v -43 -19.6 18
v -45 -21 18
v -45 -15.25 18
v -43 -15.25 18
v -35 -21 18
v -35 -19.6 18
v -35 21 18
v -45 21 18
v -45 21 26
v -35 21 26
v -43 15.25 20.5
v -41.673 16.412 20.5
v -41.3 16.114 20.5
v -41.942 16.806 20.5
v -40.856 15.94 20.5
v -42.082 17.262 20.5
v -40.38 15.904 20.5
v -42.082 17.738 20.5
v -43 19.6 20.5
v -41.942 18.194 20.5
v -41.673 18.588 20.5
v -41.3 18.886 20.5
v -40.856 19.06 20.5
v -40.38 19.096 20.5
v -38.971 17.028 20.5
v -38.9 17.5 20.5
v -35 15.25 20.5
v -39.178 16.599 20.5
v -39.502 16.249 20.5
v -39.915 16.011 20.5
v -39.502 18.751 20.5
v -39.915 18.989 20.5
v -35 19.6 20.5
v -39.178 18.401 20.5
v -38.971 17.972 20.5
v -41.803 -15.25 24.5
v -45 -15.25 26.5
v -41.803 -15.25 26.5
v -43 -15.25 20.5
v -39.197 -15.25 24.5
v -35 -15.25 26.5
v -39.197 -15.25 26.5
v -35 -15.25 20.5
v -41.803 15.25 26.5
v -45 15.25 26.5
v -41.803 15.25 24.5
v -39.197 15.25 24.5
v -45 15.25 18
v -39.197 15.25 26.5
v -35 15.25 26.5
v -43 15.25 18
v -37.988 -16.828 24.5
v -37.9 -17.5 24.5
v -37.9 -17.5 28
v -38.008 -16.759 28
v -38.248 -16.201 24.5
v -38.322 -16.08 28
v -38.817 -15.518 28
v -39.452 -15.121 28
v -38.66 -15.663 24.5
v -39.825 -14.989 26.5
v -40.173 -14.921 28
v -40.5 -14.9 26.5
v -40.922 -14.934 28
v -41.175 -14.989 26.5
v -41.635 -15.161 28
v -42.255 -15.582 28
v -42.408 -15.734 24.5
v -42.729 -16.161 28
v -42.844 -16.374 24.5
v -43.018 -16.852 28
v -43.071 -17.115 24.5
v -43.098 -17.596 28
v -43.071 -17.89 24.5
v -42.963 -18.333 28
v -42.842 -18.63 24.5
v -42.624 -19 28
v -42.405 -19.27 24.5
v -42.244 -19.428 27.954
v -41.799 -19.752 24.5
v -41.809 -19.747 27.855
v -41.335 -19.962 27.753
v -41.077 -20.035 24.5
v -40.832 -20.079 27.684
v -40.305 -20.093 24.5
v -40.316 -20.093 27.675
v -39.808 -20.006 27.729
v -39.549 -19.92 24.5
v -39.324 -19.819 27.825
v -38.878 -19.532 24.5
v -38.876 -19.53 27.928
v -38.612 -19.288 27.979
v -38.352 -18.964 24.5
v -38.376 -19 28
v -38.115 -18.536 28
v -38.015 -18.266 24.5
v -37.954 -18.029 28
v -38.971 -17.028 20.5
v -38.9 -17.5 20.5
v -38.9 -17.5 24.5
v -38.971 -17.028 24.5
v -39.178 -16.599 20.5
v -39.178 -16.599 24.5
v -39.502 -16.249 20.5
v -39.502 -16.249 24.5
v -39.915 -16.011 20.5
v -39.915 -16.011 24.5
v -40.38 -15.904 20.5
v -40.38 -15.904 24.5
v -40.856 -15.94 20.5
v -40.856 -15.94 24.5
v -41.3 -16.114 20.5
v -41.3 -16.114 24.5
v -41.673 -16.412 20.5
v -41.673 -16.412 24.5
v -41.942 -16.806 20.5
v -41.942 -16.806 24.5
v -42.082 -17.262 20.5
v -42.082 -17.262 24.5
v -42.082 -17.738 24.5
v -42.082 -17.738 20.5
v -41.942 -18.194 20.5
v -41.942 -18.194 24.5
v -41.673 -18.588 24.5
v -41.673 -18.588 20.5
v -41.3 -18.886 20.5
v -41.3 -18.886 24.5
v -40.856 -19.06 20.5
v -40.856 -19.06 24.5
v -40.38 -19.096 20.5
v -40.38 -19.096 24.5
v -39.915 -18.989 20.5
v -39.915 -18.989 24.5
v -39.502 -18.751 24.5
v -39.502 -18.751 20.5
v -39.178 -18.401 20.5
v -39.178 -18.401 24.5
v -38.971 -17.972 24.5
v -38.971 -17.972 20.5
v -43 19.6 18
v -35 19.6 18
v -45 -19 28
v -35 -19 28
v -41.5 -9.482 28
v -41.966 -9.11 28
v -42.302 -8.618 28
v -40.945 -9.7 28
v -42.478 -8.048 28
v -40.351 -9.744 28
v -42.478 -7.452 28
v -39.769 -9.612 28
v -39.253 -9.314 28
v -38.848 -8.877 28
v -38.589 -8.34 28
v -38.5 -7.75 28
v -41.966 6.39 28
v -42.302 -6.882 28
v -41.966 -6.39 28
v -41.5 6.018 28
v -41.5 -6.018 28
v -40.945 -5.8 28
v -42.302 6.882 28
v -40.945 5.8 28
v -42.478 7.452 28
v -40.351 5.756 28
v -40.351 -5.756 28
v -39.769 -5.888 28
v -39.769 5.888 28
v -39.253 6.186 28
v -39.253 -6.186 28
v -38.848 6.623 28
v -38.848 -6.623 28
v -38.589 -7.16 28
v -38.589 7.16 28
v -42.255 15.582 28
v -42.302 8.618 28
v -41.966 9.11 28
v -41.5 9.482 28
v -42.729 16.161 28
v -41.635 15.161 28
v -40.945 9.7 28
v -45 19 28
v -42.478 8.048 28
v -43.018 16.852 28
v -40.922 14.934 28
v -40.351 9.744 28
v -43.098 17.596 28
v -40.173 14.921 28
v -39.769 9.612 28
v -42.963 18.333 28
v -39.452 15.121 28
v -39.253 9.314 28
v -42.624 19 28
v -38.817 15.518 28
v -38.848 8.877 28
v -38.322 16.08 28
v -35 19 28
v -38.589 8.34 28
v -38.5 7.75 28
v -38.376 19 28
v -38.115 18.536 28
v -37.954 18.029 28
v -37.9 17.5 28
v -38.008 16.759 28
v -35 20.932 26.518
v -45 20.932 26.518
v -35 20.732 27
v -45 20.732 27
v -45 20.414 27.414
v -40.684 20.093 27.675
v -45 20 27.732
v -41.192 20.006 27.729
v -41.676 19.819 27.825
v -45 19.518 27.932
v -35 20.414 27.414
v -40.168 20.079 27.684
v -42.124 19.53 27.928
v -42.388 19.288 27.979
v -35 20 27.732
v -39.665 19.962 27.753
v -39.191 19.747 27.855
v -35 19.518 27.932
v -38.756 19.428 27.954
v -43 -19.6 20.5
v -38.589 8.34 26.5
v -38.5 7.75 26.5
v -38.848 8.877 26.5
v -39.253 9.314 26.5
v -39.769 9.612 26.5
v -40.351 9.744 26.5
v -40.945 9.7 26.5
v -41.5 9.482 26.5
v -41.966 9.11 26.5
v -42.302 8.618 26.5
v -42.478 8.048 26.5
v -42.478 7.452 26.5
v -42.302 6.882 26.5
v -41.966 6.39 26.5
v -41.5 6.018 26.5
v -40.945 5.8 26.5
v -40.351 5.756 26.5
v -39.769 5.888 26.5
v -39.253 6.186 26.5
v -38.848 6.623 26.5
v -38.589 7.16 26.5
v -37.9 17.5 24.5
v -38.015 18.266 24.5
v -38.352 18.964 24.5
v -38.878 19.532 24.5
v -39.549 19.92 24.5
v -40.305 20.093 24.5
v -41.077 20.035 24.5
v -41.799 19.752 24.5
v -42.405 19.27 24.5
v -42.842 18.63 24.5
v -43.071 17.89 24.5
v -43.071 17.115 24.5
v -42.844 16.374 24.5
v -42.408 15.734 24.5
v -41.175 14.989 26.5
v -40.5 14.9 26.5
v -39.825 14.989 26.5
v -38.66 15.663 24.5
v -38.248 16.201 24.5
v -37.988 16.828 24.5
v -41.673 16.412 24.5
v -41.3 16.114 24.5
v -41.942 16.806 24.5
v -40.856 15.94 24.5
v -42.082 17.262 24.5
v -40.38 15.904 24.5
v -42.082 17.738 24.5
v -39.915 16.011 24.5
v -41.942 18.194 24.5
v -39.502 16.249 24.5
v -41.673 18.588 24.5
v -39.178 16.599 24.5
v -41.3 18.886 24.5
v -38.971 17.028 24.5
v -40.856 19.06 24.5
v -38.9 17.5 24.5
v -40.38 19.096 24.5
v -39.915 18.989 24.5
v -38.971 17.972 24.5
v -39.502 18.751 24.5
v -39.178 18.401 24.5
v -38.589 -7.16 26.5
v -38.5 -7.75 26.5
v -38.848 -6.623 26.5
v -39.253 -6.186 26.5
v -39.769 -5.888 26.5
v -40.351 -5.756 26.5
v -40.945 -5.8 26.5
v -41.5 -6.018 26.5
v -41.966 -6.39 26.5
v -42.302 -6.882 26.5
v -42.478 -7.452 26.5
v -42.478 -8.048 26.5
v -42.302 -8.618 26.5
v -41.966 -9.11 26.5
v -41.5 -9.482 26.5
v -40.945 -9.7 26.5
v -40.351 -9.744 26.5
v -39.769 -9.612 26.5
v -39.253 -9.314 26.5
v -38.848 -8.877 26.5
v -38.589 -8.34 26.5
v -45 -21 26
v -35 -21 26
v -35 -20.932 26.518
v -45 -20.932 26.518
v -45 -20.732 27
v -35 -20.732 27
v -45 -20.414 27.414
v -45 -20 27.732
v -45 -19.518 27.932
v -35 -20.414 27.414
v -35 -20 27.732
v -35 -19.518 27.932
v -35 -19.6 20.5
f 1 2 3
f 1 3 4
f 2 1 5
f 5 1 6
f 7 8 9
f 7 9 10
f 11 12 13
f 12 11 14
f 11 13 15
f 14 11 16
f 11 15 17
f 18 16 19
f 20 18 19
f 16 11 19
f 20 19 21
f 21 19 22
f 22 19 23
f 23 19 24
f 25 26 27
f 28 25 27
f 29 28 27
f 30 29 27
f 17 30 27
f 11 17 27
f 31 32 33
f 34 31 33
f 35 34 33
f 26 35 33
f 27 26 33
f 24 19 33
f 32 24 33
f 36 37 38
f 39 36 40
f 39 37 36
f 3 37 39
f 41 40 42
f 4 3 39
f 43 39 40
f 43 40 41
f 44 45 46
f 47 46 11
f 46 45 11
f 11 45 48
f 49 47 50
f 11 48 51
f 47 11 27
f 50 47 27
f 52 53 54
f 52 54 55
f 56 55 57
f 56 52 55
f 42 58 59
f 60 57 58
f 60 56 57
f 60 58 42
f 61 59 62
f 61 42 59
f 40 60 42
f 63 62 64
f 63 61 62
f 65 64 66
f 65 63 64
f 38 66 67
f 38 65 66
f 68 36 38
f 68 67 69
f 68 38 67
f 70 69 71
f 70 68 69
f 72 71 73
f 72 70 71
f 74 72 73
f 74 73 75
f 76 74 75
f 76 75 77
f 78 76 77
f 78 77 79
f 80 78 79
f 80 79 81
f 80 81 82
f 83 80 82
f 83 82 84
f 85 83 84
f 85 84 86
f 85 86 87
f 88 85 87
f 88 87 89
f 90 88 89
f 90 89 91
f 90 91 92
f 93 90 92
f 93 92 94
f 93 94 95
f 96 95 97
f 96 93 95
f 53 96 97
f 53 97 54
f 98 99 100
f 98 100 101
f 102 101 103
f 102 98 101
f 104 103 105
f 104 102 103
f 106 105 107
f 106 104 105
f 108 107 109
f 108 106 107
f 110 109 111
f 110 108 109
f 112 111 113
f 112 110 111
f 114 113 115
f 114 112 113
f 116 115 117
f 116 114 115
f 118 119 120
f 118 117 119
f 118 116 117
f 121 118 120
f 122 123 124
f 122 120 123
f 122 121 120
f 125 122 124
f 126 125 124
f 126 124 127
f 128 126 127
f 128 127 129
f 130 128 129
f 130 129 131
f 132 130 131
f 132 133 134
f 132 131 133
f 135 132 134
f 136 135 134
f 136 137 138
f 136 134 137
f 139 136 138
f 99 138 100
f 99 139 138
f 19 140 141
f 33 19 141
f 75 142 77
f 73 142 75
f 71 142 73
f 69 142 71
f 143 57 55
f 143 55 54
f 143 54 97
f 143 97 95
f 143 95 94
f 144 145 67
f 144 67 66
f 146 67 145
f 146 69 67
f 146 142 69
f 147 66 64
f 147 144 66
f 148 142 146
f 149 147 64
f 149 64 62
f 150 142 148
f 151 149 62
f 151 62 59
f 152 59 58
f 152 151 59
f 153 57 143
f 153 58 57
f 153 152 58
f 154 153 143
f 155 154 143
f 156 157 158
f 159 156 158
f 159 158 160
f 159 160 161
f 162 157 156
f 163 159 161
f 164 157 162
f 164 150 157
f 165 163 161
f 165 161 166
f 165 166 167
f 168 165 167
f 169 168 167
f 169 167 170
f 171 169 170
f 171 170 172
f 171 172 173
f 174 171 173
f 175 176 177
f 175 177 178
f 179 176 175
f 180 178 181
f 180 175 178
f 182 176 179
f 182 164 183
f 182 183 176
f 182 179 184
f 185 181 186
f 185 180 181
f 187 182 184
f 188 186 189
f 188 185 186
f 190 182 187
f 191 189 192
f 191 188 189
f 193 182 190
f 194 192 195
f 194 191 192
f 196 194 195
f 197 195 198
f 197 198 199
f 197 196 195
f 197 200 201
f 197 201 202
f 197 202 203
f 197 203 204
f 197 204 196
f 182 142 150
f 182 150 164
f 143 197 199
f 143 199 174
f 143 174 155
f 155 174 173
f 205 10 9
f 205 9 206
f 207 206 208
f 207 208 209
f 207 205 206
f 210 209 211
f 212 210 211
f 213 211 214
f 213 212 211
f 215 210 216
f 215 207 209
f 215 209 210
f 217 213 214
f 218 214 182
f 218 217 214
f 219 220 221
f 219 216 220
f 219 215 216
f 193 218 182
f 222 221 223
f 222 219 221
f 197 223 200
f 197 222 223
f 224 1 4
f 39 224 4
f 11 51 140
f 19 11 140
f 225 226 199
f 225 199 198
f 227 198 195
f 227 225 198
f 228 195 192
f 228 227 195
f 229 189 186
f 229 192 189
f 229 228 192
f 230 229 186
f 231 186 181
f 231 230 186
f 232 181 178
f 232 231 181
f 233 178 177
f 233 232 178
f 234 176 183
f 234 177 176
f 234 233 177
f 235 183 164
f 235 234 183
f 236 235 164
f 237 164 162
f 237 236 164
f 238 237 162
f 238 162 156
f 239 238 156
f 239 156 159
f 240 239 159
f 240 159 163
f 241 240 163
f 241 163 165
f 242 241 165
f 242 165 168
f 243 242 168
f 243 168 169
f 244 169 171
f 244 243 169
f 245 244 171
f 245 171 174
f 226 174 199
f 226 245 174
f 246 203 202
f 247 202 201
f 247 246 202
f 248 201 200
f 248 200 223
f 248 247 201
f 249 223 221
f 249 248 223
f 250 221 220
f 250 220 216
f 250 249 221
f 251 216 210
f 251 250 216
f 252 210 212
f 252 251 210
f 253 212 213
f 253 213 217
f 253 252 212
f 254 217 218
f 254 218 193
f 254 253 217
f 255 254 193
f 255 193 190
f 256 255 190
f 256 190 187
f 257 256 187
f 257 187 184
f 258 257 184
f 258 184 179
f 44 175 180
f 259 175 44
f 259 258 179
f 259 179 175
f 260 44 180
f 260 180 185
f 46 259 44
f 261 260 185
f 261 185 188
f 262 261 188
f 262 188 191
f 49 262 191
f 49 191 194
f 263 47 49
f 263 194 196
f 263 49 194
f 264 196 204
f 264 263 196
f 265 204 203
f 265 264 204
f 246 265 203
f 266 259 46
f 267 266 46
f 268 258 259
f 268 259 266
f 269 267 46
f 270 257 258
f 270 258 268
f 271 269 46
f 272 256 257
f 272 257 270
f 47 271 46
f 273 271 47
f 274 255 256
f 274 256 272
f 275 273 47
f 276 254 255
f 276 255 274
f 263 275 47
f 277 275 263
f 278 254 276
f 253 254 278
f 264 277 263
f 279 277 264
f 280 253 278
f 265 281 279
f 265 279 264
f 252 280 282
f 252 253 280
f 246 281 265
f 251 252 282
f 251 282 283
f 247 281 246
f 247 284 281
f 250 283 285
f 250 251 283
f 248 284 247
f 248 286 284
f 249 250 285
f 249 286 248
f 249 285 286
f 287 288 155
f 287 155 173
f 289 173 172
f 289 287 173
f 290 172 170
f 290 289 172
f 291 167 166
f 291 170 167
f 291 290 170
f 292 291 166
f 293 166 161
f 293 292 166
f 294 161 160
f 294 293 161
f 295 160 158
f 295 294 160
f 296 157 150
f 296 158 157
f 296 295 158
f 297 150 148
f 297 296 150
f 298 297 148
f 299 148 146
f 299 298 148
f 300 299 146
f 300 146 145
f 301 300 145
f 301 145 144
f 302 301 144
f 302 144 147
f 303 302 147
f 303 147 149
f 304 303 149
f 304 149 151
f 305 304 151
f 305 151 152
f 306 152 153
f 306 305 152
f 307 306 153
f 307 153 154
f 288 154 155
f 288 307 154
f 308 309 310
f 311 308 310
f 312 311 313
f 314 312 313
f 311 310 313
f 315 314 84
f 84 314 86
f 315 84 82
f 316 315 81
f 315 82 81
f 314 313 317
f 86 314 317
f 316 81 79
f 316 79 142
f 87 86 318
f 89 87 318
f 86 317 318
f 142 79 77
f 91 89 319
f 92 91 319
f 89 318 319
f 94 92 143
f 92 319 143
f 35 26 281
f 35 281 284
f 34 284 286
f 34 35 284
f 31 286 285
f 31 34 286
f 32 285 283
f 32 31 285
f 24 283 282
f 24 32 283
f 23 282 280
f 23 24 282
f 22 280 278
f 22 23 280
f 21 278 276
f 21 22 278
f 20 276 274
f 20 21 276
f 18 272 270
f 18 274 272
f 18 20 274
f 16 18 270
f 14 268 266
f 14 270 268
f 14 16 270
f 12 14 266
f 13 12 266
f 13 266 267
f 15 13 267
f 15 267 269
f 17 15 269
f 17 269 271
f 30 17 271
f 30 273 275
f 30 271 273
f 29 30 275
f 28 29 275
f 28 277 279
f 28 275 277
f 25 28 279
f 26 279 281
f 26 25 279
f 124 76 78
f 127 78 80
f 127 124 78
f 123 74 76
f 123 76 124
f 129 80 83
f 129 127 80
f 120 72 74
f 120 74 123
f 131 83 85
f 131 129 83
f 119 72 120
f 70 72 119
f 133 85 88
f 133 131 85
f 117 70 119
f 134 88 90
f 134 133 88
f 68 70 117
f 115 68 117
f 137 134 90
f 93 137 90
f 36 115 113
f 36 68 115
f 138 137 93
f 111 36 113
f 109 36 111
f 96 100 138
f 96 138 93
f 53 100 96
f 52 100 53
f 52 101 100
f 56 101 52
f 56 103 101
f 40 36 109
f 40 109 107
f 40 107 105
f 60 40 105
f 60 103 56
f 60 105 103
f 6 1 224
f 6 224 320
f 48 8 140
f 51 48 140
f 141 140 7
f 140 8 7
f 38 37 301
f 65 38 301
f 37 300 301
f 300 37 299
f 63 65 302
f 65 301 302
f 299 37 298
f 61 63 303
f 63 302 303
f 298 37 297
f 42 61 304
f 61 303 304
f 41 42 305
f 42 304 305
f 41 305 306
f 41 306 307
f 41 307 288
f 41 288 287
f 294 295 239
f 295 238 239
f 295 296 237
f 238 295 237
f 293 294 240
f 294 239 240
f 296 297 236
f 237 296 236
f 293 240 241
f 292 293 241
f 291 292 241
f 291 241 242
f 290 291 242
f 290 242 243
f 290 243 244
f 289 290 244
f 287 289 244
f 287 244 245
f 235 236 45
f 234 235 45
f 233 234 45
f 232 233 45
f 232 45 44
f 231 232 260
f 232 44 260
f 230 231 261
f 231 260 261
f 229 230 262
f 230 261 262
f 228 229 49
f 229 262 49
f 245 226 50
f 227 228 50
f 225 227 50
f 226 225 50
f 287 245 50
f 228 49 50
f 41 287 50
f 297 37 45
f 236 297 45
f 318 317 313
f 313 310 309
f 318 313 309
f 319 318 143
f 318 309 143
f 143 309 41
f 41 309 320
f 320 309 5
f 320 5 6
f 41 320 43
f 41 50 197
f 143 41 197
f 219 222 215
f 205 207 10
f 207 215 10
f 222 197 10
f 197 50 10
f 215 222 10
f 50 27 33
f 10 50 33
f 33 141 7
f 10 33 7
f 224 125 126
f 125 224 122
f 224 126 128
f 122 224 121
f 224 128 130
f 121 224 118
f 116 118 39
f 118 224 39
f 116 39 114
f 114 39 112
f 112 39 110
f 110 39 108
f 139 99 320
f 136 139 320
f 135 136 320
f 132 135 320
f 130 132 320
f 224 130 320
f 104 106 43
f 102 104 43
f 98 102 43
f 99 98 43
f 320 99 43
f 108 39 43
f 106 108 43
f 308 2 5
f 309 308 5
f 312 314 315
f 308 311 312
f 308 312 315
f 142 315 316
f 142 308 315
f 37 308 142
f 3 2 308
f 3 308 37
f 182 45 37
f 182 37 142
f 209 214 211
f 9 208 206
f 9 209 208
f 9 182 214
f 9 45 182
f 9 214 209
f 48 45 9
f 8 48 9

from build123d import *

# Parameters (mm, degrees)
CYLINDER322_R     = 2.6
CYLINDER322_DEPTH = 10
CYLINDER321_R     = 2.6
CYLINDER321_DEPTH = 10
CYLINDER320_R     = 1.6
CYLINDER320_DEPTH = 14
CYLINDER319_R     = 1.6
CYLINDER319_DEPTH = 15
CYLINDER326_R     = 2
CYLINDER326_DEPTH = 18
CYLINDER325_R     = 2
CYLINDER325_DEPTH = 18
BOX241_W          = 69.8
BOX241_H          = 39.2
BOX241_DEPTH      = 4
BOX240_W          = 12
BOX240_H          = 30.5
BOX240_DEPTH      = 8.5
BOX235_W          = 10
BOX235_H          = 42
BOX235_DEPTH      = 10
FILLET123_R       = 2


with BuildPart() as zylinder324:
    # Cylinder322 → Cylinder322 (new body)
    with BuildSketch(Plane(origin=(-40.5, -17.5, 24), x_dir=(1, 0, 0), z_dir=(0, 0, 1))):
        Circle(CYLINDER322_R)
    extrude(amount=CYLINDER322_DEPTH)


with BuildPart() as zylinder323:
    # Cylinder321 → Cylinder321 (new body)
    with BuildSketch(Plane(origin=(-40.5, 17.5, 24), x_dir=(1, 0, 0), z_dir=(0, 0, 1))):
        Circle(CYLINDER321_R)
    extrude(amount=CYLINDER321_DEPTH)


with BuildPart() as zylinder322:
    # Cylinder320 → Cylinder320 (new body)
    with BuildSketch(Plane(origin=(-40.5, 17.5, 13), x_dir=(1, 0, 0), z_dir=(0, 0, 1))):
        Circle(CYLINDER320_R)
    extrude(amount=CYLINDER320_DEPTH)


with BuildPart() as zylinder321:
    # Cylinder319 → Cylinder319 (new body)
    with BuildSketch(Plane(origin=(-40.5, -17.5, 12.25), x_dir=(1, 0, 0), z_dir=(0, 0, 1))):
        Circle(CYLINDER319_R)
    extrude(amount=CYLINDER319_DEPTH)


with BuildPart() as zylinder328:
    # Cylinder326 → Cylinder326 (new body)
    with BuildSketch(Plane(origin=(-40.5, -2, 12.25), x_dir=(1, 0, 0), z_dir=(0, 0, 1))):
        Circle(CYLINDER326_R)
    extrude(amount=CYLINDER326_DEPTH)


with BuildPart() as fusion217:
    # Cylinder325 → Cylinder325 (new body)
    with BuildSketch(Plane(origin=(-40.5, -17.5, 12.25), x_dir=(1, 0, 0), z_dir=(0, 0, 1))):
        Circle(CYLINDER325_R)
    extrude(amount=CYLINDER325_DEPTH)

    # Fusion217: union Zylinder328
    add(zylinder328.part)


with BuildPart() as fusion217_1:
    # Fusion217 placement: moved
    add(fusion217.part.moved(Location((0, 9.75, 0))))


with BuildPart() as board006:
    # Box241 → Box241 (new body)
    with BuildSketch(Plane(origin=(-43, -19.6, 16), x_dir=(1, 0, 0), z_dir=(0, 0, 1))):
        with Locations((34.9, 19.6)):
            Rectangle(BOX241_W, BOX241_H)
    extrude(amount=BOX241_DEPTH)


with BuildPart() as fusion216:
    # Box240 → Box240 (new body)
    with BuildSketch(Plane(origin=(-46, -15.25, 17.5), x_dir=(1, 0, 0), z_dir=(0, 0, 1))):
        with Locations((6, 15.25)):
            Rectangle(BOX240_W, BOX240_H)
    extrude(amount=BOX240_DEPTH)

    # Fusion216: union Zylinder324, Zylinder323, Zylinder322, Zylinder321, Fusion217, board006
    add(zylinder324.part)
    add(zylinder323.part)
    add(zylinder322.part)
    add(zylinder321.part)
    add(fusion217_1.part)
    add(board006.part)


with BuildPart() as cut150:
    # Box235 → Box235 (new body)
    with BuildSketch(Plane(origin=(-45, -21, 17.5), x_dir=(1, 0, 0), z_dir=(0, 0, 1))):
        with Locations((5, 21)):
            Rectangle(BOX235_W, BOX235_H)
    extrude(amount=BOX235_DEPTH)

    # Fillet123
    fillet123_edges = [cut150.edges().sort_by_distance(p)[0] for p in [
        (-40, -21, 27.5),
        (-40, 21, 27.5),
    ]]
    fillet(fillet123_edges, radius=FILLET123_R)

    # Cut150: cut Fusion216
    add(fusion216.part, mode=Mode.SUBTRACT)


with BuildPart() as cut150_1:
    # Cut150 placement: moved
    add(cut150.part.moved(Location((0, 0, 0.5))))


solid = cut150_1.part
